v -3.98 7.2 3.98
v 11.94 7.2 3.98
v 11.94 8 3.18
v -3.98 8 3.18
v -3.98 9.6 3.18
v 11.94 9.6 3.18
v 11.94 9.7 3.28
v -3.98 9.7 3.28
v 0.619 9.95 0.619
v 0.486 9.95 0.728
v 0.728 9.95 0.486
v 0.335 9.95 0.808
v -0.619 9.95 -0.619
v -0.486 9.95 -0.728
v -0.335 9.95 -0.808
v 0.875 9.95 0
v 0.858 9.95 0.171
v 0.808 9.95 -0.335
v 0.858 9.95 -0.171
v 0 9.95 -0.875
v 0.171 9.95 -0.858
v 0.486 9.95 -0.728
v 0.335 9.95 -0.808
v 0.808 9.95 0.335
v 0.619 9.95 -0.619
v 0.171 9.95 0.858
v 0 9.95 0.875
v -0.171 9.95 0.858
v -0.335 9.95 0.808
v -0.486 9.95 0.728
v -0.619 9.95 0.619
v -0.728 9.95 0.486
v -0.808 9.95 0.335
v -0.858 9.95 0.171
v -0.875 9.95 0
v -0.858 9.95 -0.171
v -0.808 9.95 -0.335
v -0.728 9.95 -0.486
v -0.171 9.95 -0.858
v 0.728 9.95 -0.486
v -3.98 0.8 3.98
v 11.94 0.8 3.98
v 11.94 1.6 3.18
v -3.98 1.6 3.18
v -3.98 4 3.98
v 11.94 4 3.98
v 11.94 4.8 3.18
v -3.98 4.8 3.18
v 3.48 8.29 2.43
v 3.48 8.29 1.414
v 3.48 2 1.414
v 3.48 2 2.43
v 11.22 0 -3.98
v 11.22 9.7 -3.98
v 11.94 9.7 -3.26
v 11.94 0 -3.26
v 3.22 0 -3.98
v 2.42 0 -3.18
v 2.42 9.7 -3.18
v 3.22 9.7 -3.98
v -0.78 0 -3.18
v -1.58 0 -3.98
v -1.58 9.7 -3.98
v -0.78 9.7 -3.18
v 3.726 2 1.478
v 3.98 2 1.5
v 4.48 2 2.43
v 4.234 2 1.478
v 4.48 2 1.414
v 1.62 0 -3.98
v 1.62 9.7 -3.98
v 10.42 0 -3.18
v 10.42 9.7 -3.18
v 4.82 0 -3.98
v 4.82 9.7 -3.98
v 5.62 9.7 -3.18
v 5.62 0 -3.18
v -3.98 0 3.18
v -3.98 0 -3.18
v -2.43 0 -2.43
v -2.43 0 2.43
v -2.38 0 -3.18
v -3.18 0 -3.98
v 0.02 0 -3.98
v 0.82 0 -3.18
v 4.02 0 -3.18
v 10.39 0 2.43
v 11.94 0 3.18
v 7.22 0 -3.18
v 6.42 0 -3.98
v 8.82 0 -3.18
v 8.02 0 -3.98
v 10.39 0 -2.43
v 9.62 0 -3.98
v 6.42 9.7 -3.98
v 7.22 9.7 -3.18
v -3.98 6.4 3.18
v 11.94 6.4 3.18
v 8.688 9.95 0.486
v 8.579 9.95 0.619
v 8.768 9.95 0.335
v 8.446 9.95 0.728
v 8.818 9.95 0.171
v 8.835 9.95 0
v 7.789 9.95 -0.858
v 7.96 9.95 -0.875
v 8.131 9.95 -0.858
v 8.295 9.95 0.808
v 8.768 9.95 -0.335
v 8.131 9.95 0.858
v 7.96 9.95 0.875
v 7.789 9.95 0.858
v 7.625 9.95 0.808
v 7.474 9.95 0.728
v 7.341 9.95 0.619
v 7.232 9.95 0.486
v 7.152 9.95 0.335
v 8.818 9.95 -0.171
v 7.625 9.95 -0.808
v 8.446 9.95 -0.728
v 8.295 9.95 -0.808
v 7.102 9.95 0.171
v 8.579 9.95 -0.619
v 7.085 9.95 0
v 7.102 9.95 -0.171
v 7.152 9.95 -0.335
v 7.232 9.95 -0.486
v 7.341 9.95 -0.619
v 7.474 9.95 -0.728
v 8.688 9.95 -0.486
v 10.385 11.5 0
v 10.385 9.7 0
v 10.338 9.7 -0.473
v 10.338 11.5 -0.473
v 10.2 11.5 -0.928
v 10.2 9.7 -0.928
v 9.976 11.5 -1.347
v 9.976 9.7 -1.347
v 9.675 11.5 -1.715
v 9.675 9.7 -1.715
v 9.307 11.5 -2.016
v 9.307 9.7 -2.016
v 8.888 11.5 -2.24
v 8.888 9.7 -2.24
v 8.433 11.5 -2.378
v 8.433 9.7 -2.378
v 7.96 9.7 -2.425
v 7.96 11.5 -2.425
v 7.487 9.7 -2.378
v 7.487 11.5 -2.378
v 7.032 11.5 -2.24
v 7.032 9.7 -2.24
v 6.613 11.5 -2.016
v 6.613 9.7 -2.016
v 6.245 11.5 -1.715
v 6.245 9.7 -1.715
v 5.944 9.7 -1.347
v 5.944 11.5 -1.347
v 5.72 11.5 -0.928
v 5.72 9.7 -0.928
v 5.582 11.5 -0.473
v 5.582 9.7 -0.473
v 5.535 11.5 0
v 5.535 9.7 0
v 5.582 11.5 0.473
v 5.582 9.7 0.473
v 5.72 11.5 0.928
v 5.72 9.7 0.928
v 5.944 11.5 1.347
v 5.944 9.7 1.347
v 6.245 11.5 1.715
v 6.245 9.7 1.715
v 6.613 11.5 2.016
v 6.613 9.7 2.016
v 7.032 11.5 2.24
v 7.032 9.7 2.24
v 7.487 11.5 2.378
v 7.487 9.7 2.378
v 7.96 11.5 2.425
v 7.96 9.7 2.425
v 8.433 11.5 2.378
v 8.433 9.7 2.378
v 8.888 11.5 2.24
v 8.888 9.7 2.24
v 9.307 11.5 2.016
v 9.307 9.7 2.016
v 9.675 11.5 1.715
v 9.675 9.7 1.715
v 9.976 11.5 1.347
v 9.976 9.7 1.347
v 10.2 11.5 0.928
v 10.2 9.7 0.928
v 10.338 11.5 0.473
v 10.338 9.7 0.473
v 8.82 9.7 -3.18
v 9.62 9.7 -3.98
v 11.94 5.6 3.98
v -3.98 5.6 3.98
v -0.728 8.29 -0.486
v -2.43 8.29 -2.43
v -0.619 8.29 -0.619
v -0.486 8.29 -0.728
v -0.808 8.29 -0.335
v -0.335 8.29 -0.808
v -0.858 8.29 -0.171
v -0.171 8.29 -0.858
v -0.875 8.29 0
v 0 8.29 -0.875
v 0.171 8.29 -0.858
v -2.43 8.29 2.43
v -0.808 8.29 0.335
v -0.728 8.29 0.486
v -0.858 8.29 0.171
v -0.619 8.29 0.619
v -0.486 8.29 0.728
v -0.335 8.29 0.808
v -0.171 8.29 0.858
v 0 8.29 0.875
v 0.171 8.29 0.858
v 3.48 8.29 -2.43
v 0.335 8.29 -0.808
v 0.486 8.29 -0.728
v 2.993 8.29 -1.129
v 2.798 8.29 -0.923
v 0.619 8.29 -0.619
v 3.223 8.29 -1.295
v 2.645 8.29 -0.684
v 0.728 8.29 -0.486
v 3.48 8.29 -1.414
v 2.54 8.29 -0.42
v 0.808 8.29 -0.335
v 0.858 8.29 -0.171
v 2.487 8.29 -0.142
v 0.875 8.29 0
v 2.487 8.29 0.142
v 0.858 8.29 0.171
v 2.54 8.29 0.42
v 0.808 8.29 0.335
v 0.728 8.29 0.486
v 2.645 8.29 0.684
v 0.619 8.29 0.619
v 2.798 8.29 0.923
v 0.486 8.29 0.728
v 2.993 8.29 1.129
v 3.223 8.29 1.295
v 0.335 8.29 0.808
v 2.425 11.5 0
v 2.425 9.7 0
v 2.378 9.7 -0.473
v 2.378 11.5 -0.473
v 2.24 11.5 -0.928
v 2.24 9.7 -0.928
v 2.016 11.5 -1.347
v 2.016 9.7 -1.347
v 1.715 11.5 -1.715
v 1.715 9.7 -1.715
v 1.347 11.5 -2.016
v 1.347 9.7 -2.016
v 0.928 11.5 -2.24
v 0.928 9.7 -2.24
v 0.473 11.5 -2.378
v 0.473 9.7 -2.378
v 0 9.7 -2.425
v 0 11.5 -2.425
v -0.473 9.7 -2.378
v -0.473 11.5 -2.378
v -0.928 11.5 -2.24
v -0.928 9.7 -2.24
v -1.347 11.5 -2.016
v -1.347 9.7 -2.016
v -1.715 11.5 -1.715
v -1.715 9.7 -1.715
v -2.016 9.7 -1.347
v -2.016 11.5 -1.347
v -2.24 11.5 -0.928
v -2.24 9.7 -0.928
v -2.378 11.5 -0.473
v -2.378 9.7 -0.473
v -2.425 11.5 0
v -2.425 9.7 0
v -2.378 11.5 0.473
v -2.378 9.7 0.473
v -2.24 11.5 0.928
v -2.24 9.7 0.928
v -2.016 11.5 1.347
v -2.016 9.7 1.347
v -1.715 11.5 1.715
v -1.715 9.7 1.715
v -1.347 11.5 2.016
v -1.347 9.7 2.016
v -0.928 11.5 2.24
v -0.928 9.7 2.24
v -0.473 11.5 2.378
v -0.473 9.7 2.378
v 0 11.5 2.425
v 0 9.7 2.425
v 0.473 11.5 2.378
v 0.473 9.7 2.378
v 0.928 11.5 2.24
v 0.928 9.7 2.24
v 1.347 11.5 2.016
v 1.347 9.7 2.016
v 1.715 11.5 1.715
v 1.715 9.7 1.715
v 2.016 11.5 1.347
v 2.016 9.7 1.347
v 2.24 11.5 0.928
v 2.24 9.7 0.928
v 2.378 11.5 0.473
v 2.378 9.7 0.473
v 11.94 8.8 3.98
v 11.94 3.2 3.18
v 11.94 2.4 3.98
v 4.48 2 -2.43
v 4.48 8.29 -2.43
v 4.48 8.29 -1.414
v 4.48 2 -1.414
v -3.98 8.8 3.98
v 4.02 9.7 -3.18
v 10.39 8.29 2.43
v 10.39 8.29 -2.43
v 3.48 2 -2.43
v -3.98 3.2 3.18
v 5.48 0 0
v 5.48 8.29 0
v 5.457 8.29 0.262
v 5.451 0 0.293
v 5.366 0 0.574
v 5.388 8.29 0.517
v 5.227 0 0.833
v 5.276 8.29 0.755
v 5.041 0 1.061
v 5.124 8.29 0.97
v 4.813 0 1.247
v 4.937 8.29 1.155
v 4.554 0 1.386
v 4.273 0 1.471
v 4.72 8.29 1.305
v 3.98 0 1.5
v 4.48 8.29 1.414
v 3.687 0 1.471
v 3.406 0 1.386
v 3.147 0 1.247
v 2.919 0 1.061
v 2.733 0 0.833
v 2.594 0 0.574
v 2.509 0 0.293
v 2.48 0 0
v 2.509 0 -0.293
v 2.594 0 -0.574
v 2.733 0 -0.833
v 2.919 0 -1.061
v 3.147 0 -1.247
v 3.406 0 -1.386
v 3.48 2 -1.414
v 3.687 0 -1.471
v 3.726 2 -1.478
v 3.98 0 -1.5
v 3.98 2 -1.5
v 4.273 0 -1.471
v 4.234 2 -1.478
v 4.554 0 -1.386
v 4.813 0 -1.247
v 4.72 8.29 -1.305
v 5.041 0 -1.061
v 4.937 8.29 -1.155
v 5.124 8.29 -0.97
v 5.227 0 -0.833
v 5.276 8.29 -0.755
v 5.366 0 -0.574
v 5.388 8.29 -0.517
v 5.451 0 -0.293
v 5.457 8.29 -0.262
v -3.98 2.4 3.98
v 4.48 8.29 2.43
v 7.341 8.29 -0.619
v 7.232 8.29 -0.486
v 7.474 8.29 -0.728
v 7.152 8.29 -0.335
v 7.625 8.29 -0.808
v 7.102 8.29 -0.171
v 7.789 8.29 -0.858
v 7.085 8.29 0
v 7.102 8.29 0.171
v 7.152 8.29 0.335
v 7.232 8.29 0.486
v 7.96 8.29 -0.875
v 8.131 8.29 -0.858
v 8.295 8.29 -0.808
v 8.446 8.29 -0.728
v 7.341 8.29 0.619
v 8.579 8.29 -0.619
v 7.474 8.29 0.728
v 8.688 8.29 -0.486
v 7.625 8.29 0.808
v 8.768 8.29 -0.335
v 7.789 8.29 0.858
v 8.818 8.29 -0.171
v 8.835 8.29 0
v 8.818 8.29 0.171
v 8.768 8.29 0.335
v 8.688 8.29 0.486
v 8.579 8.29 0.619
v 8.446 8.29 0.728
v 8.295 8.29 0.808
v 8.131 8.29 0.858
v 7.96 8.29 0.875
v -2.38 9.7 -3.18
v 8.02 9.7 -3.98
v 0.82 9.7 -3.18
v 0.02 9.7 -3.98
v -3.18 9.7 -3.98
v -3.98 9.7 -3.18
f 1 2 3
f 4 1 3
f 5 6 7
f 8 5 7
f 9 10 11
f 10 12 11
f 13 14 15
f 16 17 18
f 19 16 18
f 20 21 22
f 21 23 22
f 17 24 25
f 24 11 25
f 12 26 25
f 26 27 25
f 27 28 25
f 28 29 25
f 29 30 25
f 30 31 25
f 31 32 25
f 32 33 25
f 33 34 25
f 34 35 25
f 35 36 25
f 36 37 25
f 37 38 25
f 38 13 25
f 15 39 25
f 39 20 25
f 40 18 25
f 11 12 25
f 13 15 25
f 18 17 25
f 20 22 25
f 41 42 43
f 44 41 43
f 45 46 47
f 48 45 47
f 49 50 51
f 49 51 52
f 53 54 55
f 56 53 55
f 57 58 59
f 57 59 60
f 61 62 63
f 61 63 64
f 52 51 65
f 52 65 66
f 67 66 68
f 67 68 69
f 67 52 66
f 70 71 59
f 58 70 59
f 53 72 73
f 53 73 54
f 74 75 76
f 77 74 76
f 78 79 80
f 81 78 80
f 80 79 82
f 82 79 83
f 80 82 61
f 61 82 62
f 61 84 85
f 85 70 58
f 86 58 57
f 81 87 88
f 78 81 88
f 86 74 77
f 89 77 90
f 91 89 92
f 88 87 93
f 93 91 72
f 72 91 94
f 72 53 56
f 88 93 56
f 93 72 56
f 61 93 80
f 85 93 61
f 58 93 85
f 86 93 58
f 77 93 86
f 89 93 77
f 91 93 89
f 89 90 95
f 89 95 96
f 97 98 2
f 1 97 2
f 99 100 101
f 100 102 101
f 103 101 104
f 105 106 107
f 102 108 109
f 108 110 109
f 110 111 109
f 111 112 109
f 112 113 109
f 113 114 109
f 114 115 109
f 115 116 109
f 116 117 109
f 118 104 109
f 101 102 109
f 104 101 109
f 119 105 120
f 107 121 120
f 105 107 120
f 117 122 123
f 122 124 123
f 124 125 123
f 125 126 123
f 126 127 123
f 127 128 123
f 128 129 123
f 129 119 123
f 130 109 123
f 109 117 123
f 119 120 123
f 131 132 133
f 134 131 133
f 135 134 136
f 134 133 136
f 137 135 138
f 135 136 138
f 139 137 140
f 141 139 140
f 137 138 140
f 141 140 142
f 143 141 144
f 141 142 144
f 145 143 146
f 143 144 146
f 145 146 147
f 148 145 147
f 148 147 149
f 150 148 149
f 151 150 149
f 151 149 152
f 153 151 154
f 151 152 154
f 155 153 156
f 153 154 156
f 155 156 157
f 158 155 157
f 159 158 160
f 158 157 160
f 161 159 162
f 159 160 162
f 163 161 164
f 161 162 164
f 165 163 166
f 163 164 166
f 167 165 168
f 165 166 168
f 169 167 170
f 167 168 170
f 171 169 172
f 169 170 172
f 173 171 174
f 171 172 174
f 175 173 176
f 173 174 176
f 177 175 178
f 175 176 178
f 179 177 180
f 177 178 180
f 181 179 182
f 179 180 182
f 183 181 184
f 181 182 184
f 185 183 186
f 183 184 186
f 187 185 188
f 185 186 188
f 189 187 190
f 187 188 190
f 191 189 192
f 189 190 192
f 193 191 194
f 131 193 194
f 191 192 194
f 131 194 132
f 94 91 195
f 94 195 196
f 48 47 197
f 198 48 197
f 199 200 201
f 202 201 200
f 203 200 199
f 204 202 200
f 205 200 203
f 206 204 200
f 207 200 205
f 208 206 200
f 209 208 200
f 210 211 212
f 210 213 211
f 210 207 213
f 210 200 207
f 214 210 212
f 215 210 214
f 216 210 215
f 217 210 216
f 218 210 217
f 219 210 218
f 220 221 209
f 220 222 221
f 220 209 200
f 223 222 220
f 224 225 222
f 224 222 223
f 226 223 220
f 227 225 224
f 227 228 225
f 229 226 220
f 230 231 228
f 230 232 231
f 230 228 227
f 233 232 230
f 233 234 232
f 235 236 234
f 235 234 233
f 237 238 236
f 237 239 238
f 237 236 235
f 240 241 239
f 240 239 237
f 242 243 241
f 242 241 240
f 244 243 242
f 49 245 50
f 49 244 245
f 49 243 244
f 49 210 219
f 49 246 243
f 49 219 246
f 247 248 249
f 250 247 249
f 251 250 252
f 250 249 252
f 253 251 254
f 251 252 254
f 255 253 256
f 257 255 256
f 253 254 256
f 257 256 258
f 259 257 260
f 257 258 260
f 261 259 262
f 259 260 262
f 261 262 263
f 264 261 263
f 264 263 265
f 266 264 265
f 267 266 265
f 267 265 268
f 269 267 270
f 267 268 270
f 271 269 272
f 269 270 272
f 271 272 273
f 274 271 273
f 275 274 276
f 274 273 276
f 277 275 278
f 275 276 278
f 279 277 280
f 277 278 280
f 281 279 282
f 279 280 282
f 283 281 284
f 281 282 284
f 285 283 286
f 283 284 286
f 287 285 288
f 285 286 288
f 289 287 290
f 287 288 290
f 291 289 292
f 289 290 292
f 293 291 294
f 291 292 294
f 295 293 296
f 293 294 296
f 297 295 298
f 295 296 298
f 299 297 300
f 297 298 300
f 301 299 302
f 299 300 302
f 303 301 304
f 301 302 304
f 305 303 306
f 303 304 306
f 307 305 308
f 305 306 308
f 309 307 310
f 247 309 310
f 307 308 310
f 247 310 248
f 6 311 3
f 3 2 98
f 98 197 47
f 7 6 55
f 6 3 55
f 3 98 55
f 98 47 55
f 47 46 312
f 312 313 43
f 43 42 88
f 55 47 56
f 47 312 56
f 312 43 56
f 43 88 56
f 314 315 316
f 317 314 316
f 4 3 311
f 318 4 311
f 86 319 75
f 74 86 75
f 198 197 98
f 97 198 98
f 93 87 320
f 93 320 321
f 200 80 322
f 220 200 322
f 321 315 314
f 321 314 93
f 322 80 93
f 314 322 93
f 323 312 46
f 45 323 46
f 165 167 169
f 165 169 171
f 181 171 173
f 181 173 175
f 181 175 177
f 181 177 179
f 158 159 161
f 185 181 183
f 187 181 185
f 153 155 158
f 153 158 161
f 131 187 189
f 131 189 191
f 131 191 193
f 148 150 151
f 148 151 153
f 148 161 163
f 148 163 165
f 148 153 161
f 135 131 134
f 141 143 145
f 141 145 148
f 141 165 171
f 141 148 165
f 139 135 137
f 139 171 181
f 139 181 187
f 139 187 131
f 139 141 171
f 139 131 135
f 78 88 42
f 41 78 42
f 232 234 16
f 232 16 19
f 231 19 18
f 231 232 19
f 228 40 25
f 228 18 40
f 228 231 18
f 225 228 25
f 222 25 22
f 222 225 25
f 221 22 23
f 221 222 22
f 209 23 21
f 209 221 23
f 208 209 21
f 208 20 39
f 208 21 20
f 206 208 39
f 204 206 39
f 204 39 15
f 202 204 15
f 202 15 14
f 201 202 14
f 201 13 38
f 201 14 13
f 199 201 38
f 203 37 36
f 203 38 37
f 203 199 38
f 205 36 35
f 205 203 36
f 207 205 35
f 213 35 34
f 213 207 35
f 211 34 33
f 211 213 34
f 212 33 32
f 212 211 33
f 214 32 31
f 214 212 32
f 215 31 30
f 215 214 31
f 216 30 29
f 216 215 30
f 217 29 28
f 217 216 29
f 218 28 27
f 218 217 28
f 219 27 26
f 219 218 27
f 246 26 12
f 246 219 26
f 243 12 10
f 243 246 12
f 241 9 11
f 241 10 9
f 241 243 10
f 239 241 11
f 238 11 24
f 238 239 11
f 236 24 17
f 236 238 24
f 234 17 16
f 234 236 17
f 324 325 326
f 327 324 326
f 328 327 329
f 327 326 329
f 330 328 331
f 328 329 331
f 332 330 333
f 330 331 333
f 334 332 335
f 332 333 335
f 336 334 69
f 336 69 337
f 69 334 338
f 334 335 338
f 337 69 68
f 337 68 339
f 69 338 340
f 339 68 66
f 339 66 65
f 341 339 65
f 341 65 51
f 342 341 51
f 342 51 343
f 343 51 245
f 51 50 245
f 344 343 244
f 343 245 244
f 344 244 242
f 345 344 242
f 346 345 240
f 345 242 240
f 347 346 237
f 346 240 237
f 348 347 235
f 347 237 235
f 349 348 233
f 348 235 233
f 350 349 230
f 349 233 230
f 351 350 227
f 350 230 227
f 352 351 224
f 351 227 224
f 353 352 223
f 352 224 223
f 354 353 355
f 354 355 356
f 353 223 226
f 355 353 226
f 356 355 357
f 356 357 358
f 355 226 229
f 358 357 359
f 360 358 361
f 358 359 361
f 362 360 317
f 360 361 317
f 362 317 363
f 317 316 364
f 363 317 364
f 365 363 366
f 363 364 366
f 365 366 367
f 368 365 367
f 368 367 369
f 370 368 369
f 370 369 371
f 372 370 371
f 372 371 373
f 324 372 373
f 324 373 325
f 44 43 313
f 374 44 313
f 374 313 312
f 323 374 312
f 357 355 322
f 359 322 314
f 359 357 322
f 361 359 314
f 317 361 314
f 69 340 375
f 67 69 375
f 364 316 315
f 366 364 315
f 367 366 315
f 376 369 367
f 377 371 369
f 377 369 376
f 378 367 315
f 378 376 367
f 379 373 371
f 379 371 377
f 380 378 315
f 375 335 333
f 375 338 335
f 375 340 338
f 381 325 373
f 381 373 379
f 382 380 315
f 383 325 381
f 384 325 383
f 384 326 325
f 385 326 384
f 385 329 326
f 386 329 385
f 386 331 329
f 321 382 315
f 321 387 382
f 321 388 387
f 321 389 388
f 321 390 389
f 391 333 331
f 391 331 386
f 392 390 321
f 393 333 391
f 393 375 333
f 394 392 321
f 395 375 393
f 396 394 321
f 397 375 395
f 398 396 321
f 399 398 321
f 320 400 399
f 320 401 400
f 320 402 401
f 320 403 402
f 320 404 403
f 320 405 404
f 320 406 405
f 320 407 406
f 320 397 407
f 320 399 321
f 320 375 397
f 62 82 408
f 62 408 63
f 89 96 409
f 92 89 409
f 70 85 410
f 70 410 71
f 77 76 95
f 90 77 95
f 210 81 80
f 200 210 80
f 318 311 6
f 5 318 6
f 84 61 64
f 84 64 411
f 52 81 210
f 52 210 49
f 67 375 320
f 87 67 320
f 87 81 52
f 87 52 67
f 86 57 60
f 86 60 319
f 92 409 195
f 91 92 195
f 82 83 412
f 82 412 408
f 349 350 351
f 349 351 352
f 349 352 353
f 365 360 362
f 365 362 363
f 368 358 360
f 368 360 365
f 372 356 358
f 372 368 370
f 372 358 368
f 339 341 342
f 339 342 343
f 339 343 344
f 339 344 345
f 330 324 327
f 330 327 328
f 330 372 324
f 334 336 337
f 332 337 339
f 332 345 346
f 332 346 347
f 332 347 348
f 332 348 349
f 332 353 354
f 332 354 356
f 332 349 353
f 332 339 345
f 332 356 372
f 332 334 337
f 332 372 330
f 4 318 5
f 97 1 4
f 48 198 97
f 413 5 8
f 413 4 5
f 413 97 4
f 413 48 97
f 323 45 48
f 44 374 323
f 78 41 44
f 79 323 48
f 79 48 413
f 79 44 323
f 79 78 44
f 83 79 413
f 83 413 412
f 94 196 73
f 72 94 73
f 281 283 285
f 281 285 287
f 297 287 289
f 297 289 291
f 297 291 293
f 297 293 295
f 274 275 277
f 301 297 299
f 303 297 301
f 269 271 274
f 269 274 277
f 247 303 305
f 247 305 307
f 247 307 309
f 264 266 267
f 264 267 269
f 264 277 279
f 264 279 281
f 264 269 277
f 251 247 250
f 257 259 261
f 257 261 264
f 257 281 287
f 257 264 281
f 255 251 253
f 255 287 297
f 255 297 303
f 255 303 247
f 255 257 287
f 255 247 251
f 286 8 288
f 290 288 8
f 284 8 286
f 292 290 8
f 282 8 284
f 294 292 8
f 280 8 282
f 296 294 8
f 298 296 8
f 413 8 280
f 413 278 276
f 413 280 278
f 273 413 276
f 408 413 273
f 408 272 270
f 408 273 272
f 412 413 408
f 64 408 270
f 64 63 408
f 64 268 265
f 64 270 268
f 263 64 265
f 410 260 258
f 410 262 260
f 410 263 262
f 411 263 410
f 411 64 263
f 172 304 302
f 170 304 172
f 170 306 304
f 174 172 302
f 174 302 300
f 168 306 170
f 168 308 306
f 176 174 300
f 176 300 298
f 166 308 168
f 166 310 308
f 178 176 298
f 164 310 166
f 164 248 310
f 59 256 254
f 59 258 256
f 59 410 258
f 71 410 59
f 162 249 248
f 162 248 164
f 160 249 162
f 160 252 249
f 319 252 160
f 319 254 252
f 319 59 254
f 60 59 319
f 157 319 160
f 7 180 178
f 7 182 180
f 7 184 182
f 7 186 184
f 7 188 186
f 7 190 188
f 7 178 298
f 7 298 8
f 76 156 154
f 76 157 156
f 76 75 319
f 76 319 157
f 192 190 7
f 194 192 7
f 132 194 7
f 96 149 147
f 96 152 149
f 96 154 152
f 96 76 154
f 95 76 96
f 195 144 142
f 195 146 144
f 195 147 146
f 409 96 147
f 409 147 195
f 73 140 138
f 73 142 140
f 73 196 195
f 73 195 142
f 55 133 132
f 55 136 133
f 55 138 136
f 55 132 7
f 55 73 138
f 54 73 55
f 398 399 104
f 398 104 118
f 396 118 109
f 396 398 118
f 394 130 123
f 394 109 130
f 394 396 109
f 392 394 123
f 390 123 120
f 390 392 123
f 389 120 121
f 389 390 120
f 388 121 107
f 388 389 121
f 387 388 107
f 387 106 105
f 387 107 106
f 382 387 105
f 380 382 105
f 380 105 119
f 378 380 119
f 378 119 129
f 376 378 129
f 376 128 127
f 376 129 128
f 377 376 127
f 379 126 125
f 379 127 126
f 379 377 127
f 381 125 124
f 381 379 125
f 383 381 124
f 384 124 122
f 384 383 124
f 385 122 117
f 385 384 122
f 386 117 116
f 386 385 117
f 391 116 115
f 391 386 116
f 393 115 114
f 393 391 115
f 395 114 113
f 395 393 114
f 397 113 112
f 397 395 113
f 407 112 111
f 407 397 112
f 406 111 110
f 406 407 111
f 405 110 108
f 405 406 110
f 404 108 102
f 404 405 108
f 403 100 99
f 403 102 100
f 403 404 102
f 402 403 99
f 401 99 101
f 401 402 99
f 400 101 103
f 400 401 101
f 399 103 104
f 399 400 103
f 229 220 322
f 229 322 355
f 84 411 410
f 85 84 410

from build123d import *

# Parameters (mm, degrees)
SKETCH1_W       = 7.96
SKETCH1_H       = 7.96
EXTRUDE1_DEPTH  = 9.7
SKETCH2_R       = 2.425
EXTRUDE2_DEPTH  = 1.8
LPATTERN1_COUNT = 2
LPATTERN1_PITCH = 7.96
SHELL1_T        = -1.55
SKETCH3_W       = 12.82
SKETCH3_H       = 4.86
EXTRUDE3_DEPTH  = 0.14
SKETCH4_R       = 1.5
EXTRUDE4_DEPTH  = 8.29
SKETCH5_W       = 1
SKETCH5_H       = 4.86
EXTRUDE5_DEPTH  = 6.29
EXTRUDE6_DEPTH  = 16.92
LPATTERN2_COUNT = 7
LPATTERN2_PITCH = 1.6
EXTRUDE7_DEPTH  = 10.7
LPATTERN3_COUNT = 11
LPATTERN3_PITCH = 1.6


with BuildPart() as part:
    # Sketch1 → Extrude1 (new body)
    with BuildSketch(Plane(origin=(0, 0, 0), x_dir=(1, 0, 0), z_dir=(0, 1, 0))):
        Rectangle(SKETCH1_W, SKETCH1_H)
    extrude1 = extrude(amount=EXTRUDE1_DEPTH)

    # Sketch2 → Extrude2 (add)
    with BuildSketch(Plane(origin=(0, 9.7, 0), x_dir=(1, 0, 0), z_dir=(0, 1, 0))):
        Circle(SKETCH2_R)
    extrude2 = extrude(amount=EXTRUDE2_DEPTH)

    # LPattern1: Extrude1, Extrude2 ×2
    with Locations(*[(i * LPATTERN1_PITCH, 0, 0) for i in range(1, LPATTERN1_COUNT)]):
        add(extrude1)
        add(extrude2)

    # Shell1
    shell1_openings = [part.faces().sort_by_distance(p)[0] for p in [
        (3.98, 0, 0),
    ]]
    offset(amount=SHELL1_T, openings=shell1_openings, kind=Kind.INTERSECTION)

    # Sketch3 → Extrude3 (cut)
    with BuildSketch(Plane.XZ.offset(-8.15)):
        with Locations((3.98, 0)):
            Rectangle(SKETCH3_W, SKETCH3_H)
    extrude(amount=-EXTRUDE3_DEPTH, mode=Mode.SUBTRACT)

    # Sketch4 → Extrude4 (add)
    with BuildSketch(Plane.XZ.offset(-8.29)):
        with Locations((3.98, 0)):
            Circle(SKETCH4_R)
    extrude(amount=EXTRUDE4_DEPTH)

    # Sketch5 → Extrude5 (add)
    with BuildSketch(Plane.XZ.offset(-8.29)):
        with Locations((3.98, 0)):
            Rectangle(SKETCH5_W, SKETCH5_H)
    extrude(amount=EXTRUDE5_DEPTH)

    # Sketch7 → Extrude6 (cut, through all)
    with BuildSketch(Plane(origin=(11.94, 0, 0), x_dir=(0, 0, -1), z_dir=(1, 0, 0))):
        Polygon((-3.98, -0.8), (-3.18, 0), (-3.98, 0.8), align=None)
    extrude6 = extrude(amount=-EXTRUDE6_DEPTH, mode=Mode.SUBTRACT)

    # LPattern2: Extrude6 ×7
    with Locations(*[(0, i * LPATTERN2_PITCH, 0) for i in range(1, LPATTERN2_COUNT)]):
        add(extrude6, mode=Mode.SUBTRACT)

    # Sketch8 → Extrude7 (cut, through all)
    with BuildSketch(Plane(origin=(0, 9.7, 0), x_dir=(1, 0, 0), z_dir=(0, 1, 0))):
        Polygon((-3.98, 3.18), (-3.18, 3.98), (-4.78, 3.98), align=None)
    extrude7 = extrude(amount=-EXTRUDE7_DEPTH, mode=Mode.SUBTRACT)

    # LPattern3: Extrude7 ×11
    with Locations(*[(i * LPATTERN3_PITCH, 0, 0) for i in range(1, LPATTERN3_COUNT)]):
        add(extrude7, mode=Mode.SUBTRACT)


solid = part.part
